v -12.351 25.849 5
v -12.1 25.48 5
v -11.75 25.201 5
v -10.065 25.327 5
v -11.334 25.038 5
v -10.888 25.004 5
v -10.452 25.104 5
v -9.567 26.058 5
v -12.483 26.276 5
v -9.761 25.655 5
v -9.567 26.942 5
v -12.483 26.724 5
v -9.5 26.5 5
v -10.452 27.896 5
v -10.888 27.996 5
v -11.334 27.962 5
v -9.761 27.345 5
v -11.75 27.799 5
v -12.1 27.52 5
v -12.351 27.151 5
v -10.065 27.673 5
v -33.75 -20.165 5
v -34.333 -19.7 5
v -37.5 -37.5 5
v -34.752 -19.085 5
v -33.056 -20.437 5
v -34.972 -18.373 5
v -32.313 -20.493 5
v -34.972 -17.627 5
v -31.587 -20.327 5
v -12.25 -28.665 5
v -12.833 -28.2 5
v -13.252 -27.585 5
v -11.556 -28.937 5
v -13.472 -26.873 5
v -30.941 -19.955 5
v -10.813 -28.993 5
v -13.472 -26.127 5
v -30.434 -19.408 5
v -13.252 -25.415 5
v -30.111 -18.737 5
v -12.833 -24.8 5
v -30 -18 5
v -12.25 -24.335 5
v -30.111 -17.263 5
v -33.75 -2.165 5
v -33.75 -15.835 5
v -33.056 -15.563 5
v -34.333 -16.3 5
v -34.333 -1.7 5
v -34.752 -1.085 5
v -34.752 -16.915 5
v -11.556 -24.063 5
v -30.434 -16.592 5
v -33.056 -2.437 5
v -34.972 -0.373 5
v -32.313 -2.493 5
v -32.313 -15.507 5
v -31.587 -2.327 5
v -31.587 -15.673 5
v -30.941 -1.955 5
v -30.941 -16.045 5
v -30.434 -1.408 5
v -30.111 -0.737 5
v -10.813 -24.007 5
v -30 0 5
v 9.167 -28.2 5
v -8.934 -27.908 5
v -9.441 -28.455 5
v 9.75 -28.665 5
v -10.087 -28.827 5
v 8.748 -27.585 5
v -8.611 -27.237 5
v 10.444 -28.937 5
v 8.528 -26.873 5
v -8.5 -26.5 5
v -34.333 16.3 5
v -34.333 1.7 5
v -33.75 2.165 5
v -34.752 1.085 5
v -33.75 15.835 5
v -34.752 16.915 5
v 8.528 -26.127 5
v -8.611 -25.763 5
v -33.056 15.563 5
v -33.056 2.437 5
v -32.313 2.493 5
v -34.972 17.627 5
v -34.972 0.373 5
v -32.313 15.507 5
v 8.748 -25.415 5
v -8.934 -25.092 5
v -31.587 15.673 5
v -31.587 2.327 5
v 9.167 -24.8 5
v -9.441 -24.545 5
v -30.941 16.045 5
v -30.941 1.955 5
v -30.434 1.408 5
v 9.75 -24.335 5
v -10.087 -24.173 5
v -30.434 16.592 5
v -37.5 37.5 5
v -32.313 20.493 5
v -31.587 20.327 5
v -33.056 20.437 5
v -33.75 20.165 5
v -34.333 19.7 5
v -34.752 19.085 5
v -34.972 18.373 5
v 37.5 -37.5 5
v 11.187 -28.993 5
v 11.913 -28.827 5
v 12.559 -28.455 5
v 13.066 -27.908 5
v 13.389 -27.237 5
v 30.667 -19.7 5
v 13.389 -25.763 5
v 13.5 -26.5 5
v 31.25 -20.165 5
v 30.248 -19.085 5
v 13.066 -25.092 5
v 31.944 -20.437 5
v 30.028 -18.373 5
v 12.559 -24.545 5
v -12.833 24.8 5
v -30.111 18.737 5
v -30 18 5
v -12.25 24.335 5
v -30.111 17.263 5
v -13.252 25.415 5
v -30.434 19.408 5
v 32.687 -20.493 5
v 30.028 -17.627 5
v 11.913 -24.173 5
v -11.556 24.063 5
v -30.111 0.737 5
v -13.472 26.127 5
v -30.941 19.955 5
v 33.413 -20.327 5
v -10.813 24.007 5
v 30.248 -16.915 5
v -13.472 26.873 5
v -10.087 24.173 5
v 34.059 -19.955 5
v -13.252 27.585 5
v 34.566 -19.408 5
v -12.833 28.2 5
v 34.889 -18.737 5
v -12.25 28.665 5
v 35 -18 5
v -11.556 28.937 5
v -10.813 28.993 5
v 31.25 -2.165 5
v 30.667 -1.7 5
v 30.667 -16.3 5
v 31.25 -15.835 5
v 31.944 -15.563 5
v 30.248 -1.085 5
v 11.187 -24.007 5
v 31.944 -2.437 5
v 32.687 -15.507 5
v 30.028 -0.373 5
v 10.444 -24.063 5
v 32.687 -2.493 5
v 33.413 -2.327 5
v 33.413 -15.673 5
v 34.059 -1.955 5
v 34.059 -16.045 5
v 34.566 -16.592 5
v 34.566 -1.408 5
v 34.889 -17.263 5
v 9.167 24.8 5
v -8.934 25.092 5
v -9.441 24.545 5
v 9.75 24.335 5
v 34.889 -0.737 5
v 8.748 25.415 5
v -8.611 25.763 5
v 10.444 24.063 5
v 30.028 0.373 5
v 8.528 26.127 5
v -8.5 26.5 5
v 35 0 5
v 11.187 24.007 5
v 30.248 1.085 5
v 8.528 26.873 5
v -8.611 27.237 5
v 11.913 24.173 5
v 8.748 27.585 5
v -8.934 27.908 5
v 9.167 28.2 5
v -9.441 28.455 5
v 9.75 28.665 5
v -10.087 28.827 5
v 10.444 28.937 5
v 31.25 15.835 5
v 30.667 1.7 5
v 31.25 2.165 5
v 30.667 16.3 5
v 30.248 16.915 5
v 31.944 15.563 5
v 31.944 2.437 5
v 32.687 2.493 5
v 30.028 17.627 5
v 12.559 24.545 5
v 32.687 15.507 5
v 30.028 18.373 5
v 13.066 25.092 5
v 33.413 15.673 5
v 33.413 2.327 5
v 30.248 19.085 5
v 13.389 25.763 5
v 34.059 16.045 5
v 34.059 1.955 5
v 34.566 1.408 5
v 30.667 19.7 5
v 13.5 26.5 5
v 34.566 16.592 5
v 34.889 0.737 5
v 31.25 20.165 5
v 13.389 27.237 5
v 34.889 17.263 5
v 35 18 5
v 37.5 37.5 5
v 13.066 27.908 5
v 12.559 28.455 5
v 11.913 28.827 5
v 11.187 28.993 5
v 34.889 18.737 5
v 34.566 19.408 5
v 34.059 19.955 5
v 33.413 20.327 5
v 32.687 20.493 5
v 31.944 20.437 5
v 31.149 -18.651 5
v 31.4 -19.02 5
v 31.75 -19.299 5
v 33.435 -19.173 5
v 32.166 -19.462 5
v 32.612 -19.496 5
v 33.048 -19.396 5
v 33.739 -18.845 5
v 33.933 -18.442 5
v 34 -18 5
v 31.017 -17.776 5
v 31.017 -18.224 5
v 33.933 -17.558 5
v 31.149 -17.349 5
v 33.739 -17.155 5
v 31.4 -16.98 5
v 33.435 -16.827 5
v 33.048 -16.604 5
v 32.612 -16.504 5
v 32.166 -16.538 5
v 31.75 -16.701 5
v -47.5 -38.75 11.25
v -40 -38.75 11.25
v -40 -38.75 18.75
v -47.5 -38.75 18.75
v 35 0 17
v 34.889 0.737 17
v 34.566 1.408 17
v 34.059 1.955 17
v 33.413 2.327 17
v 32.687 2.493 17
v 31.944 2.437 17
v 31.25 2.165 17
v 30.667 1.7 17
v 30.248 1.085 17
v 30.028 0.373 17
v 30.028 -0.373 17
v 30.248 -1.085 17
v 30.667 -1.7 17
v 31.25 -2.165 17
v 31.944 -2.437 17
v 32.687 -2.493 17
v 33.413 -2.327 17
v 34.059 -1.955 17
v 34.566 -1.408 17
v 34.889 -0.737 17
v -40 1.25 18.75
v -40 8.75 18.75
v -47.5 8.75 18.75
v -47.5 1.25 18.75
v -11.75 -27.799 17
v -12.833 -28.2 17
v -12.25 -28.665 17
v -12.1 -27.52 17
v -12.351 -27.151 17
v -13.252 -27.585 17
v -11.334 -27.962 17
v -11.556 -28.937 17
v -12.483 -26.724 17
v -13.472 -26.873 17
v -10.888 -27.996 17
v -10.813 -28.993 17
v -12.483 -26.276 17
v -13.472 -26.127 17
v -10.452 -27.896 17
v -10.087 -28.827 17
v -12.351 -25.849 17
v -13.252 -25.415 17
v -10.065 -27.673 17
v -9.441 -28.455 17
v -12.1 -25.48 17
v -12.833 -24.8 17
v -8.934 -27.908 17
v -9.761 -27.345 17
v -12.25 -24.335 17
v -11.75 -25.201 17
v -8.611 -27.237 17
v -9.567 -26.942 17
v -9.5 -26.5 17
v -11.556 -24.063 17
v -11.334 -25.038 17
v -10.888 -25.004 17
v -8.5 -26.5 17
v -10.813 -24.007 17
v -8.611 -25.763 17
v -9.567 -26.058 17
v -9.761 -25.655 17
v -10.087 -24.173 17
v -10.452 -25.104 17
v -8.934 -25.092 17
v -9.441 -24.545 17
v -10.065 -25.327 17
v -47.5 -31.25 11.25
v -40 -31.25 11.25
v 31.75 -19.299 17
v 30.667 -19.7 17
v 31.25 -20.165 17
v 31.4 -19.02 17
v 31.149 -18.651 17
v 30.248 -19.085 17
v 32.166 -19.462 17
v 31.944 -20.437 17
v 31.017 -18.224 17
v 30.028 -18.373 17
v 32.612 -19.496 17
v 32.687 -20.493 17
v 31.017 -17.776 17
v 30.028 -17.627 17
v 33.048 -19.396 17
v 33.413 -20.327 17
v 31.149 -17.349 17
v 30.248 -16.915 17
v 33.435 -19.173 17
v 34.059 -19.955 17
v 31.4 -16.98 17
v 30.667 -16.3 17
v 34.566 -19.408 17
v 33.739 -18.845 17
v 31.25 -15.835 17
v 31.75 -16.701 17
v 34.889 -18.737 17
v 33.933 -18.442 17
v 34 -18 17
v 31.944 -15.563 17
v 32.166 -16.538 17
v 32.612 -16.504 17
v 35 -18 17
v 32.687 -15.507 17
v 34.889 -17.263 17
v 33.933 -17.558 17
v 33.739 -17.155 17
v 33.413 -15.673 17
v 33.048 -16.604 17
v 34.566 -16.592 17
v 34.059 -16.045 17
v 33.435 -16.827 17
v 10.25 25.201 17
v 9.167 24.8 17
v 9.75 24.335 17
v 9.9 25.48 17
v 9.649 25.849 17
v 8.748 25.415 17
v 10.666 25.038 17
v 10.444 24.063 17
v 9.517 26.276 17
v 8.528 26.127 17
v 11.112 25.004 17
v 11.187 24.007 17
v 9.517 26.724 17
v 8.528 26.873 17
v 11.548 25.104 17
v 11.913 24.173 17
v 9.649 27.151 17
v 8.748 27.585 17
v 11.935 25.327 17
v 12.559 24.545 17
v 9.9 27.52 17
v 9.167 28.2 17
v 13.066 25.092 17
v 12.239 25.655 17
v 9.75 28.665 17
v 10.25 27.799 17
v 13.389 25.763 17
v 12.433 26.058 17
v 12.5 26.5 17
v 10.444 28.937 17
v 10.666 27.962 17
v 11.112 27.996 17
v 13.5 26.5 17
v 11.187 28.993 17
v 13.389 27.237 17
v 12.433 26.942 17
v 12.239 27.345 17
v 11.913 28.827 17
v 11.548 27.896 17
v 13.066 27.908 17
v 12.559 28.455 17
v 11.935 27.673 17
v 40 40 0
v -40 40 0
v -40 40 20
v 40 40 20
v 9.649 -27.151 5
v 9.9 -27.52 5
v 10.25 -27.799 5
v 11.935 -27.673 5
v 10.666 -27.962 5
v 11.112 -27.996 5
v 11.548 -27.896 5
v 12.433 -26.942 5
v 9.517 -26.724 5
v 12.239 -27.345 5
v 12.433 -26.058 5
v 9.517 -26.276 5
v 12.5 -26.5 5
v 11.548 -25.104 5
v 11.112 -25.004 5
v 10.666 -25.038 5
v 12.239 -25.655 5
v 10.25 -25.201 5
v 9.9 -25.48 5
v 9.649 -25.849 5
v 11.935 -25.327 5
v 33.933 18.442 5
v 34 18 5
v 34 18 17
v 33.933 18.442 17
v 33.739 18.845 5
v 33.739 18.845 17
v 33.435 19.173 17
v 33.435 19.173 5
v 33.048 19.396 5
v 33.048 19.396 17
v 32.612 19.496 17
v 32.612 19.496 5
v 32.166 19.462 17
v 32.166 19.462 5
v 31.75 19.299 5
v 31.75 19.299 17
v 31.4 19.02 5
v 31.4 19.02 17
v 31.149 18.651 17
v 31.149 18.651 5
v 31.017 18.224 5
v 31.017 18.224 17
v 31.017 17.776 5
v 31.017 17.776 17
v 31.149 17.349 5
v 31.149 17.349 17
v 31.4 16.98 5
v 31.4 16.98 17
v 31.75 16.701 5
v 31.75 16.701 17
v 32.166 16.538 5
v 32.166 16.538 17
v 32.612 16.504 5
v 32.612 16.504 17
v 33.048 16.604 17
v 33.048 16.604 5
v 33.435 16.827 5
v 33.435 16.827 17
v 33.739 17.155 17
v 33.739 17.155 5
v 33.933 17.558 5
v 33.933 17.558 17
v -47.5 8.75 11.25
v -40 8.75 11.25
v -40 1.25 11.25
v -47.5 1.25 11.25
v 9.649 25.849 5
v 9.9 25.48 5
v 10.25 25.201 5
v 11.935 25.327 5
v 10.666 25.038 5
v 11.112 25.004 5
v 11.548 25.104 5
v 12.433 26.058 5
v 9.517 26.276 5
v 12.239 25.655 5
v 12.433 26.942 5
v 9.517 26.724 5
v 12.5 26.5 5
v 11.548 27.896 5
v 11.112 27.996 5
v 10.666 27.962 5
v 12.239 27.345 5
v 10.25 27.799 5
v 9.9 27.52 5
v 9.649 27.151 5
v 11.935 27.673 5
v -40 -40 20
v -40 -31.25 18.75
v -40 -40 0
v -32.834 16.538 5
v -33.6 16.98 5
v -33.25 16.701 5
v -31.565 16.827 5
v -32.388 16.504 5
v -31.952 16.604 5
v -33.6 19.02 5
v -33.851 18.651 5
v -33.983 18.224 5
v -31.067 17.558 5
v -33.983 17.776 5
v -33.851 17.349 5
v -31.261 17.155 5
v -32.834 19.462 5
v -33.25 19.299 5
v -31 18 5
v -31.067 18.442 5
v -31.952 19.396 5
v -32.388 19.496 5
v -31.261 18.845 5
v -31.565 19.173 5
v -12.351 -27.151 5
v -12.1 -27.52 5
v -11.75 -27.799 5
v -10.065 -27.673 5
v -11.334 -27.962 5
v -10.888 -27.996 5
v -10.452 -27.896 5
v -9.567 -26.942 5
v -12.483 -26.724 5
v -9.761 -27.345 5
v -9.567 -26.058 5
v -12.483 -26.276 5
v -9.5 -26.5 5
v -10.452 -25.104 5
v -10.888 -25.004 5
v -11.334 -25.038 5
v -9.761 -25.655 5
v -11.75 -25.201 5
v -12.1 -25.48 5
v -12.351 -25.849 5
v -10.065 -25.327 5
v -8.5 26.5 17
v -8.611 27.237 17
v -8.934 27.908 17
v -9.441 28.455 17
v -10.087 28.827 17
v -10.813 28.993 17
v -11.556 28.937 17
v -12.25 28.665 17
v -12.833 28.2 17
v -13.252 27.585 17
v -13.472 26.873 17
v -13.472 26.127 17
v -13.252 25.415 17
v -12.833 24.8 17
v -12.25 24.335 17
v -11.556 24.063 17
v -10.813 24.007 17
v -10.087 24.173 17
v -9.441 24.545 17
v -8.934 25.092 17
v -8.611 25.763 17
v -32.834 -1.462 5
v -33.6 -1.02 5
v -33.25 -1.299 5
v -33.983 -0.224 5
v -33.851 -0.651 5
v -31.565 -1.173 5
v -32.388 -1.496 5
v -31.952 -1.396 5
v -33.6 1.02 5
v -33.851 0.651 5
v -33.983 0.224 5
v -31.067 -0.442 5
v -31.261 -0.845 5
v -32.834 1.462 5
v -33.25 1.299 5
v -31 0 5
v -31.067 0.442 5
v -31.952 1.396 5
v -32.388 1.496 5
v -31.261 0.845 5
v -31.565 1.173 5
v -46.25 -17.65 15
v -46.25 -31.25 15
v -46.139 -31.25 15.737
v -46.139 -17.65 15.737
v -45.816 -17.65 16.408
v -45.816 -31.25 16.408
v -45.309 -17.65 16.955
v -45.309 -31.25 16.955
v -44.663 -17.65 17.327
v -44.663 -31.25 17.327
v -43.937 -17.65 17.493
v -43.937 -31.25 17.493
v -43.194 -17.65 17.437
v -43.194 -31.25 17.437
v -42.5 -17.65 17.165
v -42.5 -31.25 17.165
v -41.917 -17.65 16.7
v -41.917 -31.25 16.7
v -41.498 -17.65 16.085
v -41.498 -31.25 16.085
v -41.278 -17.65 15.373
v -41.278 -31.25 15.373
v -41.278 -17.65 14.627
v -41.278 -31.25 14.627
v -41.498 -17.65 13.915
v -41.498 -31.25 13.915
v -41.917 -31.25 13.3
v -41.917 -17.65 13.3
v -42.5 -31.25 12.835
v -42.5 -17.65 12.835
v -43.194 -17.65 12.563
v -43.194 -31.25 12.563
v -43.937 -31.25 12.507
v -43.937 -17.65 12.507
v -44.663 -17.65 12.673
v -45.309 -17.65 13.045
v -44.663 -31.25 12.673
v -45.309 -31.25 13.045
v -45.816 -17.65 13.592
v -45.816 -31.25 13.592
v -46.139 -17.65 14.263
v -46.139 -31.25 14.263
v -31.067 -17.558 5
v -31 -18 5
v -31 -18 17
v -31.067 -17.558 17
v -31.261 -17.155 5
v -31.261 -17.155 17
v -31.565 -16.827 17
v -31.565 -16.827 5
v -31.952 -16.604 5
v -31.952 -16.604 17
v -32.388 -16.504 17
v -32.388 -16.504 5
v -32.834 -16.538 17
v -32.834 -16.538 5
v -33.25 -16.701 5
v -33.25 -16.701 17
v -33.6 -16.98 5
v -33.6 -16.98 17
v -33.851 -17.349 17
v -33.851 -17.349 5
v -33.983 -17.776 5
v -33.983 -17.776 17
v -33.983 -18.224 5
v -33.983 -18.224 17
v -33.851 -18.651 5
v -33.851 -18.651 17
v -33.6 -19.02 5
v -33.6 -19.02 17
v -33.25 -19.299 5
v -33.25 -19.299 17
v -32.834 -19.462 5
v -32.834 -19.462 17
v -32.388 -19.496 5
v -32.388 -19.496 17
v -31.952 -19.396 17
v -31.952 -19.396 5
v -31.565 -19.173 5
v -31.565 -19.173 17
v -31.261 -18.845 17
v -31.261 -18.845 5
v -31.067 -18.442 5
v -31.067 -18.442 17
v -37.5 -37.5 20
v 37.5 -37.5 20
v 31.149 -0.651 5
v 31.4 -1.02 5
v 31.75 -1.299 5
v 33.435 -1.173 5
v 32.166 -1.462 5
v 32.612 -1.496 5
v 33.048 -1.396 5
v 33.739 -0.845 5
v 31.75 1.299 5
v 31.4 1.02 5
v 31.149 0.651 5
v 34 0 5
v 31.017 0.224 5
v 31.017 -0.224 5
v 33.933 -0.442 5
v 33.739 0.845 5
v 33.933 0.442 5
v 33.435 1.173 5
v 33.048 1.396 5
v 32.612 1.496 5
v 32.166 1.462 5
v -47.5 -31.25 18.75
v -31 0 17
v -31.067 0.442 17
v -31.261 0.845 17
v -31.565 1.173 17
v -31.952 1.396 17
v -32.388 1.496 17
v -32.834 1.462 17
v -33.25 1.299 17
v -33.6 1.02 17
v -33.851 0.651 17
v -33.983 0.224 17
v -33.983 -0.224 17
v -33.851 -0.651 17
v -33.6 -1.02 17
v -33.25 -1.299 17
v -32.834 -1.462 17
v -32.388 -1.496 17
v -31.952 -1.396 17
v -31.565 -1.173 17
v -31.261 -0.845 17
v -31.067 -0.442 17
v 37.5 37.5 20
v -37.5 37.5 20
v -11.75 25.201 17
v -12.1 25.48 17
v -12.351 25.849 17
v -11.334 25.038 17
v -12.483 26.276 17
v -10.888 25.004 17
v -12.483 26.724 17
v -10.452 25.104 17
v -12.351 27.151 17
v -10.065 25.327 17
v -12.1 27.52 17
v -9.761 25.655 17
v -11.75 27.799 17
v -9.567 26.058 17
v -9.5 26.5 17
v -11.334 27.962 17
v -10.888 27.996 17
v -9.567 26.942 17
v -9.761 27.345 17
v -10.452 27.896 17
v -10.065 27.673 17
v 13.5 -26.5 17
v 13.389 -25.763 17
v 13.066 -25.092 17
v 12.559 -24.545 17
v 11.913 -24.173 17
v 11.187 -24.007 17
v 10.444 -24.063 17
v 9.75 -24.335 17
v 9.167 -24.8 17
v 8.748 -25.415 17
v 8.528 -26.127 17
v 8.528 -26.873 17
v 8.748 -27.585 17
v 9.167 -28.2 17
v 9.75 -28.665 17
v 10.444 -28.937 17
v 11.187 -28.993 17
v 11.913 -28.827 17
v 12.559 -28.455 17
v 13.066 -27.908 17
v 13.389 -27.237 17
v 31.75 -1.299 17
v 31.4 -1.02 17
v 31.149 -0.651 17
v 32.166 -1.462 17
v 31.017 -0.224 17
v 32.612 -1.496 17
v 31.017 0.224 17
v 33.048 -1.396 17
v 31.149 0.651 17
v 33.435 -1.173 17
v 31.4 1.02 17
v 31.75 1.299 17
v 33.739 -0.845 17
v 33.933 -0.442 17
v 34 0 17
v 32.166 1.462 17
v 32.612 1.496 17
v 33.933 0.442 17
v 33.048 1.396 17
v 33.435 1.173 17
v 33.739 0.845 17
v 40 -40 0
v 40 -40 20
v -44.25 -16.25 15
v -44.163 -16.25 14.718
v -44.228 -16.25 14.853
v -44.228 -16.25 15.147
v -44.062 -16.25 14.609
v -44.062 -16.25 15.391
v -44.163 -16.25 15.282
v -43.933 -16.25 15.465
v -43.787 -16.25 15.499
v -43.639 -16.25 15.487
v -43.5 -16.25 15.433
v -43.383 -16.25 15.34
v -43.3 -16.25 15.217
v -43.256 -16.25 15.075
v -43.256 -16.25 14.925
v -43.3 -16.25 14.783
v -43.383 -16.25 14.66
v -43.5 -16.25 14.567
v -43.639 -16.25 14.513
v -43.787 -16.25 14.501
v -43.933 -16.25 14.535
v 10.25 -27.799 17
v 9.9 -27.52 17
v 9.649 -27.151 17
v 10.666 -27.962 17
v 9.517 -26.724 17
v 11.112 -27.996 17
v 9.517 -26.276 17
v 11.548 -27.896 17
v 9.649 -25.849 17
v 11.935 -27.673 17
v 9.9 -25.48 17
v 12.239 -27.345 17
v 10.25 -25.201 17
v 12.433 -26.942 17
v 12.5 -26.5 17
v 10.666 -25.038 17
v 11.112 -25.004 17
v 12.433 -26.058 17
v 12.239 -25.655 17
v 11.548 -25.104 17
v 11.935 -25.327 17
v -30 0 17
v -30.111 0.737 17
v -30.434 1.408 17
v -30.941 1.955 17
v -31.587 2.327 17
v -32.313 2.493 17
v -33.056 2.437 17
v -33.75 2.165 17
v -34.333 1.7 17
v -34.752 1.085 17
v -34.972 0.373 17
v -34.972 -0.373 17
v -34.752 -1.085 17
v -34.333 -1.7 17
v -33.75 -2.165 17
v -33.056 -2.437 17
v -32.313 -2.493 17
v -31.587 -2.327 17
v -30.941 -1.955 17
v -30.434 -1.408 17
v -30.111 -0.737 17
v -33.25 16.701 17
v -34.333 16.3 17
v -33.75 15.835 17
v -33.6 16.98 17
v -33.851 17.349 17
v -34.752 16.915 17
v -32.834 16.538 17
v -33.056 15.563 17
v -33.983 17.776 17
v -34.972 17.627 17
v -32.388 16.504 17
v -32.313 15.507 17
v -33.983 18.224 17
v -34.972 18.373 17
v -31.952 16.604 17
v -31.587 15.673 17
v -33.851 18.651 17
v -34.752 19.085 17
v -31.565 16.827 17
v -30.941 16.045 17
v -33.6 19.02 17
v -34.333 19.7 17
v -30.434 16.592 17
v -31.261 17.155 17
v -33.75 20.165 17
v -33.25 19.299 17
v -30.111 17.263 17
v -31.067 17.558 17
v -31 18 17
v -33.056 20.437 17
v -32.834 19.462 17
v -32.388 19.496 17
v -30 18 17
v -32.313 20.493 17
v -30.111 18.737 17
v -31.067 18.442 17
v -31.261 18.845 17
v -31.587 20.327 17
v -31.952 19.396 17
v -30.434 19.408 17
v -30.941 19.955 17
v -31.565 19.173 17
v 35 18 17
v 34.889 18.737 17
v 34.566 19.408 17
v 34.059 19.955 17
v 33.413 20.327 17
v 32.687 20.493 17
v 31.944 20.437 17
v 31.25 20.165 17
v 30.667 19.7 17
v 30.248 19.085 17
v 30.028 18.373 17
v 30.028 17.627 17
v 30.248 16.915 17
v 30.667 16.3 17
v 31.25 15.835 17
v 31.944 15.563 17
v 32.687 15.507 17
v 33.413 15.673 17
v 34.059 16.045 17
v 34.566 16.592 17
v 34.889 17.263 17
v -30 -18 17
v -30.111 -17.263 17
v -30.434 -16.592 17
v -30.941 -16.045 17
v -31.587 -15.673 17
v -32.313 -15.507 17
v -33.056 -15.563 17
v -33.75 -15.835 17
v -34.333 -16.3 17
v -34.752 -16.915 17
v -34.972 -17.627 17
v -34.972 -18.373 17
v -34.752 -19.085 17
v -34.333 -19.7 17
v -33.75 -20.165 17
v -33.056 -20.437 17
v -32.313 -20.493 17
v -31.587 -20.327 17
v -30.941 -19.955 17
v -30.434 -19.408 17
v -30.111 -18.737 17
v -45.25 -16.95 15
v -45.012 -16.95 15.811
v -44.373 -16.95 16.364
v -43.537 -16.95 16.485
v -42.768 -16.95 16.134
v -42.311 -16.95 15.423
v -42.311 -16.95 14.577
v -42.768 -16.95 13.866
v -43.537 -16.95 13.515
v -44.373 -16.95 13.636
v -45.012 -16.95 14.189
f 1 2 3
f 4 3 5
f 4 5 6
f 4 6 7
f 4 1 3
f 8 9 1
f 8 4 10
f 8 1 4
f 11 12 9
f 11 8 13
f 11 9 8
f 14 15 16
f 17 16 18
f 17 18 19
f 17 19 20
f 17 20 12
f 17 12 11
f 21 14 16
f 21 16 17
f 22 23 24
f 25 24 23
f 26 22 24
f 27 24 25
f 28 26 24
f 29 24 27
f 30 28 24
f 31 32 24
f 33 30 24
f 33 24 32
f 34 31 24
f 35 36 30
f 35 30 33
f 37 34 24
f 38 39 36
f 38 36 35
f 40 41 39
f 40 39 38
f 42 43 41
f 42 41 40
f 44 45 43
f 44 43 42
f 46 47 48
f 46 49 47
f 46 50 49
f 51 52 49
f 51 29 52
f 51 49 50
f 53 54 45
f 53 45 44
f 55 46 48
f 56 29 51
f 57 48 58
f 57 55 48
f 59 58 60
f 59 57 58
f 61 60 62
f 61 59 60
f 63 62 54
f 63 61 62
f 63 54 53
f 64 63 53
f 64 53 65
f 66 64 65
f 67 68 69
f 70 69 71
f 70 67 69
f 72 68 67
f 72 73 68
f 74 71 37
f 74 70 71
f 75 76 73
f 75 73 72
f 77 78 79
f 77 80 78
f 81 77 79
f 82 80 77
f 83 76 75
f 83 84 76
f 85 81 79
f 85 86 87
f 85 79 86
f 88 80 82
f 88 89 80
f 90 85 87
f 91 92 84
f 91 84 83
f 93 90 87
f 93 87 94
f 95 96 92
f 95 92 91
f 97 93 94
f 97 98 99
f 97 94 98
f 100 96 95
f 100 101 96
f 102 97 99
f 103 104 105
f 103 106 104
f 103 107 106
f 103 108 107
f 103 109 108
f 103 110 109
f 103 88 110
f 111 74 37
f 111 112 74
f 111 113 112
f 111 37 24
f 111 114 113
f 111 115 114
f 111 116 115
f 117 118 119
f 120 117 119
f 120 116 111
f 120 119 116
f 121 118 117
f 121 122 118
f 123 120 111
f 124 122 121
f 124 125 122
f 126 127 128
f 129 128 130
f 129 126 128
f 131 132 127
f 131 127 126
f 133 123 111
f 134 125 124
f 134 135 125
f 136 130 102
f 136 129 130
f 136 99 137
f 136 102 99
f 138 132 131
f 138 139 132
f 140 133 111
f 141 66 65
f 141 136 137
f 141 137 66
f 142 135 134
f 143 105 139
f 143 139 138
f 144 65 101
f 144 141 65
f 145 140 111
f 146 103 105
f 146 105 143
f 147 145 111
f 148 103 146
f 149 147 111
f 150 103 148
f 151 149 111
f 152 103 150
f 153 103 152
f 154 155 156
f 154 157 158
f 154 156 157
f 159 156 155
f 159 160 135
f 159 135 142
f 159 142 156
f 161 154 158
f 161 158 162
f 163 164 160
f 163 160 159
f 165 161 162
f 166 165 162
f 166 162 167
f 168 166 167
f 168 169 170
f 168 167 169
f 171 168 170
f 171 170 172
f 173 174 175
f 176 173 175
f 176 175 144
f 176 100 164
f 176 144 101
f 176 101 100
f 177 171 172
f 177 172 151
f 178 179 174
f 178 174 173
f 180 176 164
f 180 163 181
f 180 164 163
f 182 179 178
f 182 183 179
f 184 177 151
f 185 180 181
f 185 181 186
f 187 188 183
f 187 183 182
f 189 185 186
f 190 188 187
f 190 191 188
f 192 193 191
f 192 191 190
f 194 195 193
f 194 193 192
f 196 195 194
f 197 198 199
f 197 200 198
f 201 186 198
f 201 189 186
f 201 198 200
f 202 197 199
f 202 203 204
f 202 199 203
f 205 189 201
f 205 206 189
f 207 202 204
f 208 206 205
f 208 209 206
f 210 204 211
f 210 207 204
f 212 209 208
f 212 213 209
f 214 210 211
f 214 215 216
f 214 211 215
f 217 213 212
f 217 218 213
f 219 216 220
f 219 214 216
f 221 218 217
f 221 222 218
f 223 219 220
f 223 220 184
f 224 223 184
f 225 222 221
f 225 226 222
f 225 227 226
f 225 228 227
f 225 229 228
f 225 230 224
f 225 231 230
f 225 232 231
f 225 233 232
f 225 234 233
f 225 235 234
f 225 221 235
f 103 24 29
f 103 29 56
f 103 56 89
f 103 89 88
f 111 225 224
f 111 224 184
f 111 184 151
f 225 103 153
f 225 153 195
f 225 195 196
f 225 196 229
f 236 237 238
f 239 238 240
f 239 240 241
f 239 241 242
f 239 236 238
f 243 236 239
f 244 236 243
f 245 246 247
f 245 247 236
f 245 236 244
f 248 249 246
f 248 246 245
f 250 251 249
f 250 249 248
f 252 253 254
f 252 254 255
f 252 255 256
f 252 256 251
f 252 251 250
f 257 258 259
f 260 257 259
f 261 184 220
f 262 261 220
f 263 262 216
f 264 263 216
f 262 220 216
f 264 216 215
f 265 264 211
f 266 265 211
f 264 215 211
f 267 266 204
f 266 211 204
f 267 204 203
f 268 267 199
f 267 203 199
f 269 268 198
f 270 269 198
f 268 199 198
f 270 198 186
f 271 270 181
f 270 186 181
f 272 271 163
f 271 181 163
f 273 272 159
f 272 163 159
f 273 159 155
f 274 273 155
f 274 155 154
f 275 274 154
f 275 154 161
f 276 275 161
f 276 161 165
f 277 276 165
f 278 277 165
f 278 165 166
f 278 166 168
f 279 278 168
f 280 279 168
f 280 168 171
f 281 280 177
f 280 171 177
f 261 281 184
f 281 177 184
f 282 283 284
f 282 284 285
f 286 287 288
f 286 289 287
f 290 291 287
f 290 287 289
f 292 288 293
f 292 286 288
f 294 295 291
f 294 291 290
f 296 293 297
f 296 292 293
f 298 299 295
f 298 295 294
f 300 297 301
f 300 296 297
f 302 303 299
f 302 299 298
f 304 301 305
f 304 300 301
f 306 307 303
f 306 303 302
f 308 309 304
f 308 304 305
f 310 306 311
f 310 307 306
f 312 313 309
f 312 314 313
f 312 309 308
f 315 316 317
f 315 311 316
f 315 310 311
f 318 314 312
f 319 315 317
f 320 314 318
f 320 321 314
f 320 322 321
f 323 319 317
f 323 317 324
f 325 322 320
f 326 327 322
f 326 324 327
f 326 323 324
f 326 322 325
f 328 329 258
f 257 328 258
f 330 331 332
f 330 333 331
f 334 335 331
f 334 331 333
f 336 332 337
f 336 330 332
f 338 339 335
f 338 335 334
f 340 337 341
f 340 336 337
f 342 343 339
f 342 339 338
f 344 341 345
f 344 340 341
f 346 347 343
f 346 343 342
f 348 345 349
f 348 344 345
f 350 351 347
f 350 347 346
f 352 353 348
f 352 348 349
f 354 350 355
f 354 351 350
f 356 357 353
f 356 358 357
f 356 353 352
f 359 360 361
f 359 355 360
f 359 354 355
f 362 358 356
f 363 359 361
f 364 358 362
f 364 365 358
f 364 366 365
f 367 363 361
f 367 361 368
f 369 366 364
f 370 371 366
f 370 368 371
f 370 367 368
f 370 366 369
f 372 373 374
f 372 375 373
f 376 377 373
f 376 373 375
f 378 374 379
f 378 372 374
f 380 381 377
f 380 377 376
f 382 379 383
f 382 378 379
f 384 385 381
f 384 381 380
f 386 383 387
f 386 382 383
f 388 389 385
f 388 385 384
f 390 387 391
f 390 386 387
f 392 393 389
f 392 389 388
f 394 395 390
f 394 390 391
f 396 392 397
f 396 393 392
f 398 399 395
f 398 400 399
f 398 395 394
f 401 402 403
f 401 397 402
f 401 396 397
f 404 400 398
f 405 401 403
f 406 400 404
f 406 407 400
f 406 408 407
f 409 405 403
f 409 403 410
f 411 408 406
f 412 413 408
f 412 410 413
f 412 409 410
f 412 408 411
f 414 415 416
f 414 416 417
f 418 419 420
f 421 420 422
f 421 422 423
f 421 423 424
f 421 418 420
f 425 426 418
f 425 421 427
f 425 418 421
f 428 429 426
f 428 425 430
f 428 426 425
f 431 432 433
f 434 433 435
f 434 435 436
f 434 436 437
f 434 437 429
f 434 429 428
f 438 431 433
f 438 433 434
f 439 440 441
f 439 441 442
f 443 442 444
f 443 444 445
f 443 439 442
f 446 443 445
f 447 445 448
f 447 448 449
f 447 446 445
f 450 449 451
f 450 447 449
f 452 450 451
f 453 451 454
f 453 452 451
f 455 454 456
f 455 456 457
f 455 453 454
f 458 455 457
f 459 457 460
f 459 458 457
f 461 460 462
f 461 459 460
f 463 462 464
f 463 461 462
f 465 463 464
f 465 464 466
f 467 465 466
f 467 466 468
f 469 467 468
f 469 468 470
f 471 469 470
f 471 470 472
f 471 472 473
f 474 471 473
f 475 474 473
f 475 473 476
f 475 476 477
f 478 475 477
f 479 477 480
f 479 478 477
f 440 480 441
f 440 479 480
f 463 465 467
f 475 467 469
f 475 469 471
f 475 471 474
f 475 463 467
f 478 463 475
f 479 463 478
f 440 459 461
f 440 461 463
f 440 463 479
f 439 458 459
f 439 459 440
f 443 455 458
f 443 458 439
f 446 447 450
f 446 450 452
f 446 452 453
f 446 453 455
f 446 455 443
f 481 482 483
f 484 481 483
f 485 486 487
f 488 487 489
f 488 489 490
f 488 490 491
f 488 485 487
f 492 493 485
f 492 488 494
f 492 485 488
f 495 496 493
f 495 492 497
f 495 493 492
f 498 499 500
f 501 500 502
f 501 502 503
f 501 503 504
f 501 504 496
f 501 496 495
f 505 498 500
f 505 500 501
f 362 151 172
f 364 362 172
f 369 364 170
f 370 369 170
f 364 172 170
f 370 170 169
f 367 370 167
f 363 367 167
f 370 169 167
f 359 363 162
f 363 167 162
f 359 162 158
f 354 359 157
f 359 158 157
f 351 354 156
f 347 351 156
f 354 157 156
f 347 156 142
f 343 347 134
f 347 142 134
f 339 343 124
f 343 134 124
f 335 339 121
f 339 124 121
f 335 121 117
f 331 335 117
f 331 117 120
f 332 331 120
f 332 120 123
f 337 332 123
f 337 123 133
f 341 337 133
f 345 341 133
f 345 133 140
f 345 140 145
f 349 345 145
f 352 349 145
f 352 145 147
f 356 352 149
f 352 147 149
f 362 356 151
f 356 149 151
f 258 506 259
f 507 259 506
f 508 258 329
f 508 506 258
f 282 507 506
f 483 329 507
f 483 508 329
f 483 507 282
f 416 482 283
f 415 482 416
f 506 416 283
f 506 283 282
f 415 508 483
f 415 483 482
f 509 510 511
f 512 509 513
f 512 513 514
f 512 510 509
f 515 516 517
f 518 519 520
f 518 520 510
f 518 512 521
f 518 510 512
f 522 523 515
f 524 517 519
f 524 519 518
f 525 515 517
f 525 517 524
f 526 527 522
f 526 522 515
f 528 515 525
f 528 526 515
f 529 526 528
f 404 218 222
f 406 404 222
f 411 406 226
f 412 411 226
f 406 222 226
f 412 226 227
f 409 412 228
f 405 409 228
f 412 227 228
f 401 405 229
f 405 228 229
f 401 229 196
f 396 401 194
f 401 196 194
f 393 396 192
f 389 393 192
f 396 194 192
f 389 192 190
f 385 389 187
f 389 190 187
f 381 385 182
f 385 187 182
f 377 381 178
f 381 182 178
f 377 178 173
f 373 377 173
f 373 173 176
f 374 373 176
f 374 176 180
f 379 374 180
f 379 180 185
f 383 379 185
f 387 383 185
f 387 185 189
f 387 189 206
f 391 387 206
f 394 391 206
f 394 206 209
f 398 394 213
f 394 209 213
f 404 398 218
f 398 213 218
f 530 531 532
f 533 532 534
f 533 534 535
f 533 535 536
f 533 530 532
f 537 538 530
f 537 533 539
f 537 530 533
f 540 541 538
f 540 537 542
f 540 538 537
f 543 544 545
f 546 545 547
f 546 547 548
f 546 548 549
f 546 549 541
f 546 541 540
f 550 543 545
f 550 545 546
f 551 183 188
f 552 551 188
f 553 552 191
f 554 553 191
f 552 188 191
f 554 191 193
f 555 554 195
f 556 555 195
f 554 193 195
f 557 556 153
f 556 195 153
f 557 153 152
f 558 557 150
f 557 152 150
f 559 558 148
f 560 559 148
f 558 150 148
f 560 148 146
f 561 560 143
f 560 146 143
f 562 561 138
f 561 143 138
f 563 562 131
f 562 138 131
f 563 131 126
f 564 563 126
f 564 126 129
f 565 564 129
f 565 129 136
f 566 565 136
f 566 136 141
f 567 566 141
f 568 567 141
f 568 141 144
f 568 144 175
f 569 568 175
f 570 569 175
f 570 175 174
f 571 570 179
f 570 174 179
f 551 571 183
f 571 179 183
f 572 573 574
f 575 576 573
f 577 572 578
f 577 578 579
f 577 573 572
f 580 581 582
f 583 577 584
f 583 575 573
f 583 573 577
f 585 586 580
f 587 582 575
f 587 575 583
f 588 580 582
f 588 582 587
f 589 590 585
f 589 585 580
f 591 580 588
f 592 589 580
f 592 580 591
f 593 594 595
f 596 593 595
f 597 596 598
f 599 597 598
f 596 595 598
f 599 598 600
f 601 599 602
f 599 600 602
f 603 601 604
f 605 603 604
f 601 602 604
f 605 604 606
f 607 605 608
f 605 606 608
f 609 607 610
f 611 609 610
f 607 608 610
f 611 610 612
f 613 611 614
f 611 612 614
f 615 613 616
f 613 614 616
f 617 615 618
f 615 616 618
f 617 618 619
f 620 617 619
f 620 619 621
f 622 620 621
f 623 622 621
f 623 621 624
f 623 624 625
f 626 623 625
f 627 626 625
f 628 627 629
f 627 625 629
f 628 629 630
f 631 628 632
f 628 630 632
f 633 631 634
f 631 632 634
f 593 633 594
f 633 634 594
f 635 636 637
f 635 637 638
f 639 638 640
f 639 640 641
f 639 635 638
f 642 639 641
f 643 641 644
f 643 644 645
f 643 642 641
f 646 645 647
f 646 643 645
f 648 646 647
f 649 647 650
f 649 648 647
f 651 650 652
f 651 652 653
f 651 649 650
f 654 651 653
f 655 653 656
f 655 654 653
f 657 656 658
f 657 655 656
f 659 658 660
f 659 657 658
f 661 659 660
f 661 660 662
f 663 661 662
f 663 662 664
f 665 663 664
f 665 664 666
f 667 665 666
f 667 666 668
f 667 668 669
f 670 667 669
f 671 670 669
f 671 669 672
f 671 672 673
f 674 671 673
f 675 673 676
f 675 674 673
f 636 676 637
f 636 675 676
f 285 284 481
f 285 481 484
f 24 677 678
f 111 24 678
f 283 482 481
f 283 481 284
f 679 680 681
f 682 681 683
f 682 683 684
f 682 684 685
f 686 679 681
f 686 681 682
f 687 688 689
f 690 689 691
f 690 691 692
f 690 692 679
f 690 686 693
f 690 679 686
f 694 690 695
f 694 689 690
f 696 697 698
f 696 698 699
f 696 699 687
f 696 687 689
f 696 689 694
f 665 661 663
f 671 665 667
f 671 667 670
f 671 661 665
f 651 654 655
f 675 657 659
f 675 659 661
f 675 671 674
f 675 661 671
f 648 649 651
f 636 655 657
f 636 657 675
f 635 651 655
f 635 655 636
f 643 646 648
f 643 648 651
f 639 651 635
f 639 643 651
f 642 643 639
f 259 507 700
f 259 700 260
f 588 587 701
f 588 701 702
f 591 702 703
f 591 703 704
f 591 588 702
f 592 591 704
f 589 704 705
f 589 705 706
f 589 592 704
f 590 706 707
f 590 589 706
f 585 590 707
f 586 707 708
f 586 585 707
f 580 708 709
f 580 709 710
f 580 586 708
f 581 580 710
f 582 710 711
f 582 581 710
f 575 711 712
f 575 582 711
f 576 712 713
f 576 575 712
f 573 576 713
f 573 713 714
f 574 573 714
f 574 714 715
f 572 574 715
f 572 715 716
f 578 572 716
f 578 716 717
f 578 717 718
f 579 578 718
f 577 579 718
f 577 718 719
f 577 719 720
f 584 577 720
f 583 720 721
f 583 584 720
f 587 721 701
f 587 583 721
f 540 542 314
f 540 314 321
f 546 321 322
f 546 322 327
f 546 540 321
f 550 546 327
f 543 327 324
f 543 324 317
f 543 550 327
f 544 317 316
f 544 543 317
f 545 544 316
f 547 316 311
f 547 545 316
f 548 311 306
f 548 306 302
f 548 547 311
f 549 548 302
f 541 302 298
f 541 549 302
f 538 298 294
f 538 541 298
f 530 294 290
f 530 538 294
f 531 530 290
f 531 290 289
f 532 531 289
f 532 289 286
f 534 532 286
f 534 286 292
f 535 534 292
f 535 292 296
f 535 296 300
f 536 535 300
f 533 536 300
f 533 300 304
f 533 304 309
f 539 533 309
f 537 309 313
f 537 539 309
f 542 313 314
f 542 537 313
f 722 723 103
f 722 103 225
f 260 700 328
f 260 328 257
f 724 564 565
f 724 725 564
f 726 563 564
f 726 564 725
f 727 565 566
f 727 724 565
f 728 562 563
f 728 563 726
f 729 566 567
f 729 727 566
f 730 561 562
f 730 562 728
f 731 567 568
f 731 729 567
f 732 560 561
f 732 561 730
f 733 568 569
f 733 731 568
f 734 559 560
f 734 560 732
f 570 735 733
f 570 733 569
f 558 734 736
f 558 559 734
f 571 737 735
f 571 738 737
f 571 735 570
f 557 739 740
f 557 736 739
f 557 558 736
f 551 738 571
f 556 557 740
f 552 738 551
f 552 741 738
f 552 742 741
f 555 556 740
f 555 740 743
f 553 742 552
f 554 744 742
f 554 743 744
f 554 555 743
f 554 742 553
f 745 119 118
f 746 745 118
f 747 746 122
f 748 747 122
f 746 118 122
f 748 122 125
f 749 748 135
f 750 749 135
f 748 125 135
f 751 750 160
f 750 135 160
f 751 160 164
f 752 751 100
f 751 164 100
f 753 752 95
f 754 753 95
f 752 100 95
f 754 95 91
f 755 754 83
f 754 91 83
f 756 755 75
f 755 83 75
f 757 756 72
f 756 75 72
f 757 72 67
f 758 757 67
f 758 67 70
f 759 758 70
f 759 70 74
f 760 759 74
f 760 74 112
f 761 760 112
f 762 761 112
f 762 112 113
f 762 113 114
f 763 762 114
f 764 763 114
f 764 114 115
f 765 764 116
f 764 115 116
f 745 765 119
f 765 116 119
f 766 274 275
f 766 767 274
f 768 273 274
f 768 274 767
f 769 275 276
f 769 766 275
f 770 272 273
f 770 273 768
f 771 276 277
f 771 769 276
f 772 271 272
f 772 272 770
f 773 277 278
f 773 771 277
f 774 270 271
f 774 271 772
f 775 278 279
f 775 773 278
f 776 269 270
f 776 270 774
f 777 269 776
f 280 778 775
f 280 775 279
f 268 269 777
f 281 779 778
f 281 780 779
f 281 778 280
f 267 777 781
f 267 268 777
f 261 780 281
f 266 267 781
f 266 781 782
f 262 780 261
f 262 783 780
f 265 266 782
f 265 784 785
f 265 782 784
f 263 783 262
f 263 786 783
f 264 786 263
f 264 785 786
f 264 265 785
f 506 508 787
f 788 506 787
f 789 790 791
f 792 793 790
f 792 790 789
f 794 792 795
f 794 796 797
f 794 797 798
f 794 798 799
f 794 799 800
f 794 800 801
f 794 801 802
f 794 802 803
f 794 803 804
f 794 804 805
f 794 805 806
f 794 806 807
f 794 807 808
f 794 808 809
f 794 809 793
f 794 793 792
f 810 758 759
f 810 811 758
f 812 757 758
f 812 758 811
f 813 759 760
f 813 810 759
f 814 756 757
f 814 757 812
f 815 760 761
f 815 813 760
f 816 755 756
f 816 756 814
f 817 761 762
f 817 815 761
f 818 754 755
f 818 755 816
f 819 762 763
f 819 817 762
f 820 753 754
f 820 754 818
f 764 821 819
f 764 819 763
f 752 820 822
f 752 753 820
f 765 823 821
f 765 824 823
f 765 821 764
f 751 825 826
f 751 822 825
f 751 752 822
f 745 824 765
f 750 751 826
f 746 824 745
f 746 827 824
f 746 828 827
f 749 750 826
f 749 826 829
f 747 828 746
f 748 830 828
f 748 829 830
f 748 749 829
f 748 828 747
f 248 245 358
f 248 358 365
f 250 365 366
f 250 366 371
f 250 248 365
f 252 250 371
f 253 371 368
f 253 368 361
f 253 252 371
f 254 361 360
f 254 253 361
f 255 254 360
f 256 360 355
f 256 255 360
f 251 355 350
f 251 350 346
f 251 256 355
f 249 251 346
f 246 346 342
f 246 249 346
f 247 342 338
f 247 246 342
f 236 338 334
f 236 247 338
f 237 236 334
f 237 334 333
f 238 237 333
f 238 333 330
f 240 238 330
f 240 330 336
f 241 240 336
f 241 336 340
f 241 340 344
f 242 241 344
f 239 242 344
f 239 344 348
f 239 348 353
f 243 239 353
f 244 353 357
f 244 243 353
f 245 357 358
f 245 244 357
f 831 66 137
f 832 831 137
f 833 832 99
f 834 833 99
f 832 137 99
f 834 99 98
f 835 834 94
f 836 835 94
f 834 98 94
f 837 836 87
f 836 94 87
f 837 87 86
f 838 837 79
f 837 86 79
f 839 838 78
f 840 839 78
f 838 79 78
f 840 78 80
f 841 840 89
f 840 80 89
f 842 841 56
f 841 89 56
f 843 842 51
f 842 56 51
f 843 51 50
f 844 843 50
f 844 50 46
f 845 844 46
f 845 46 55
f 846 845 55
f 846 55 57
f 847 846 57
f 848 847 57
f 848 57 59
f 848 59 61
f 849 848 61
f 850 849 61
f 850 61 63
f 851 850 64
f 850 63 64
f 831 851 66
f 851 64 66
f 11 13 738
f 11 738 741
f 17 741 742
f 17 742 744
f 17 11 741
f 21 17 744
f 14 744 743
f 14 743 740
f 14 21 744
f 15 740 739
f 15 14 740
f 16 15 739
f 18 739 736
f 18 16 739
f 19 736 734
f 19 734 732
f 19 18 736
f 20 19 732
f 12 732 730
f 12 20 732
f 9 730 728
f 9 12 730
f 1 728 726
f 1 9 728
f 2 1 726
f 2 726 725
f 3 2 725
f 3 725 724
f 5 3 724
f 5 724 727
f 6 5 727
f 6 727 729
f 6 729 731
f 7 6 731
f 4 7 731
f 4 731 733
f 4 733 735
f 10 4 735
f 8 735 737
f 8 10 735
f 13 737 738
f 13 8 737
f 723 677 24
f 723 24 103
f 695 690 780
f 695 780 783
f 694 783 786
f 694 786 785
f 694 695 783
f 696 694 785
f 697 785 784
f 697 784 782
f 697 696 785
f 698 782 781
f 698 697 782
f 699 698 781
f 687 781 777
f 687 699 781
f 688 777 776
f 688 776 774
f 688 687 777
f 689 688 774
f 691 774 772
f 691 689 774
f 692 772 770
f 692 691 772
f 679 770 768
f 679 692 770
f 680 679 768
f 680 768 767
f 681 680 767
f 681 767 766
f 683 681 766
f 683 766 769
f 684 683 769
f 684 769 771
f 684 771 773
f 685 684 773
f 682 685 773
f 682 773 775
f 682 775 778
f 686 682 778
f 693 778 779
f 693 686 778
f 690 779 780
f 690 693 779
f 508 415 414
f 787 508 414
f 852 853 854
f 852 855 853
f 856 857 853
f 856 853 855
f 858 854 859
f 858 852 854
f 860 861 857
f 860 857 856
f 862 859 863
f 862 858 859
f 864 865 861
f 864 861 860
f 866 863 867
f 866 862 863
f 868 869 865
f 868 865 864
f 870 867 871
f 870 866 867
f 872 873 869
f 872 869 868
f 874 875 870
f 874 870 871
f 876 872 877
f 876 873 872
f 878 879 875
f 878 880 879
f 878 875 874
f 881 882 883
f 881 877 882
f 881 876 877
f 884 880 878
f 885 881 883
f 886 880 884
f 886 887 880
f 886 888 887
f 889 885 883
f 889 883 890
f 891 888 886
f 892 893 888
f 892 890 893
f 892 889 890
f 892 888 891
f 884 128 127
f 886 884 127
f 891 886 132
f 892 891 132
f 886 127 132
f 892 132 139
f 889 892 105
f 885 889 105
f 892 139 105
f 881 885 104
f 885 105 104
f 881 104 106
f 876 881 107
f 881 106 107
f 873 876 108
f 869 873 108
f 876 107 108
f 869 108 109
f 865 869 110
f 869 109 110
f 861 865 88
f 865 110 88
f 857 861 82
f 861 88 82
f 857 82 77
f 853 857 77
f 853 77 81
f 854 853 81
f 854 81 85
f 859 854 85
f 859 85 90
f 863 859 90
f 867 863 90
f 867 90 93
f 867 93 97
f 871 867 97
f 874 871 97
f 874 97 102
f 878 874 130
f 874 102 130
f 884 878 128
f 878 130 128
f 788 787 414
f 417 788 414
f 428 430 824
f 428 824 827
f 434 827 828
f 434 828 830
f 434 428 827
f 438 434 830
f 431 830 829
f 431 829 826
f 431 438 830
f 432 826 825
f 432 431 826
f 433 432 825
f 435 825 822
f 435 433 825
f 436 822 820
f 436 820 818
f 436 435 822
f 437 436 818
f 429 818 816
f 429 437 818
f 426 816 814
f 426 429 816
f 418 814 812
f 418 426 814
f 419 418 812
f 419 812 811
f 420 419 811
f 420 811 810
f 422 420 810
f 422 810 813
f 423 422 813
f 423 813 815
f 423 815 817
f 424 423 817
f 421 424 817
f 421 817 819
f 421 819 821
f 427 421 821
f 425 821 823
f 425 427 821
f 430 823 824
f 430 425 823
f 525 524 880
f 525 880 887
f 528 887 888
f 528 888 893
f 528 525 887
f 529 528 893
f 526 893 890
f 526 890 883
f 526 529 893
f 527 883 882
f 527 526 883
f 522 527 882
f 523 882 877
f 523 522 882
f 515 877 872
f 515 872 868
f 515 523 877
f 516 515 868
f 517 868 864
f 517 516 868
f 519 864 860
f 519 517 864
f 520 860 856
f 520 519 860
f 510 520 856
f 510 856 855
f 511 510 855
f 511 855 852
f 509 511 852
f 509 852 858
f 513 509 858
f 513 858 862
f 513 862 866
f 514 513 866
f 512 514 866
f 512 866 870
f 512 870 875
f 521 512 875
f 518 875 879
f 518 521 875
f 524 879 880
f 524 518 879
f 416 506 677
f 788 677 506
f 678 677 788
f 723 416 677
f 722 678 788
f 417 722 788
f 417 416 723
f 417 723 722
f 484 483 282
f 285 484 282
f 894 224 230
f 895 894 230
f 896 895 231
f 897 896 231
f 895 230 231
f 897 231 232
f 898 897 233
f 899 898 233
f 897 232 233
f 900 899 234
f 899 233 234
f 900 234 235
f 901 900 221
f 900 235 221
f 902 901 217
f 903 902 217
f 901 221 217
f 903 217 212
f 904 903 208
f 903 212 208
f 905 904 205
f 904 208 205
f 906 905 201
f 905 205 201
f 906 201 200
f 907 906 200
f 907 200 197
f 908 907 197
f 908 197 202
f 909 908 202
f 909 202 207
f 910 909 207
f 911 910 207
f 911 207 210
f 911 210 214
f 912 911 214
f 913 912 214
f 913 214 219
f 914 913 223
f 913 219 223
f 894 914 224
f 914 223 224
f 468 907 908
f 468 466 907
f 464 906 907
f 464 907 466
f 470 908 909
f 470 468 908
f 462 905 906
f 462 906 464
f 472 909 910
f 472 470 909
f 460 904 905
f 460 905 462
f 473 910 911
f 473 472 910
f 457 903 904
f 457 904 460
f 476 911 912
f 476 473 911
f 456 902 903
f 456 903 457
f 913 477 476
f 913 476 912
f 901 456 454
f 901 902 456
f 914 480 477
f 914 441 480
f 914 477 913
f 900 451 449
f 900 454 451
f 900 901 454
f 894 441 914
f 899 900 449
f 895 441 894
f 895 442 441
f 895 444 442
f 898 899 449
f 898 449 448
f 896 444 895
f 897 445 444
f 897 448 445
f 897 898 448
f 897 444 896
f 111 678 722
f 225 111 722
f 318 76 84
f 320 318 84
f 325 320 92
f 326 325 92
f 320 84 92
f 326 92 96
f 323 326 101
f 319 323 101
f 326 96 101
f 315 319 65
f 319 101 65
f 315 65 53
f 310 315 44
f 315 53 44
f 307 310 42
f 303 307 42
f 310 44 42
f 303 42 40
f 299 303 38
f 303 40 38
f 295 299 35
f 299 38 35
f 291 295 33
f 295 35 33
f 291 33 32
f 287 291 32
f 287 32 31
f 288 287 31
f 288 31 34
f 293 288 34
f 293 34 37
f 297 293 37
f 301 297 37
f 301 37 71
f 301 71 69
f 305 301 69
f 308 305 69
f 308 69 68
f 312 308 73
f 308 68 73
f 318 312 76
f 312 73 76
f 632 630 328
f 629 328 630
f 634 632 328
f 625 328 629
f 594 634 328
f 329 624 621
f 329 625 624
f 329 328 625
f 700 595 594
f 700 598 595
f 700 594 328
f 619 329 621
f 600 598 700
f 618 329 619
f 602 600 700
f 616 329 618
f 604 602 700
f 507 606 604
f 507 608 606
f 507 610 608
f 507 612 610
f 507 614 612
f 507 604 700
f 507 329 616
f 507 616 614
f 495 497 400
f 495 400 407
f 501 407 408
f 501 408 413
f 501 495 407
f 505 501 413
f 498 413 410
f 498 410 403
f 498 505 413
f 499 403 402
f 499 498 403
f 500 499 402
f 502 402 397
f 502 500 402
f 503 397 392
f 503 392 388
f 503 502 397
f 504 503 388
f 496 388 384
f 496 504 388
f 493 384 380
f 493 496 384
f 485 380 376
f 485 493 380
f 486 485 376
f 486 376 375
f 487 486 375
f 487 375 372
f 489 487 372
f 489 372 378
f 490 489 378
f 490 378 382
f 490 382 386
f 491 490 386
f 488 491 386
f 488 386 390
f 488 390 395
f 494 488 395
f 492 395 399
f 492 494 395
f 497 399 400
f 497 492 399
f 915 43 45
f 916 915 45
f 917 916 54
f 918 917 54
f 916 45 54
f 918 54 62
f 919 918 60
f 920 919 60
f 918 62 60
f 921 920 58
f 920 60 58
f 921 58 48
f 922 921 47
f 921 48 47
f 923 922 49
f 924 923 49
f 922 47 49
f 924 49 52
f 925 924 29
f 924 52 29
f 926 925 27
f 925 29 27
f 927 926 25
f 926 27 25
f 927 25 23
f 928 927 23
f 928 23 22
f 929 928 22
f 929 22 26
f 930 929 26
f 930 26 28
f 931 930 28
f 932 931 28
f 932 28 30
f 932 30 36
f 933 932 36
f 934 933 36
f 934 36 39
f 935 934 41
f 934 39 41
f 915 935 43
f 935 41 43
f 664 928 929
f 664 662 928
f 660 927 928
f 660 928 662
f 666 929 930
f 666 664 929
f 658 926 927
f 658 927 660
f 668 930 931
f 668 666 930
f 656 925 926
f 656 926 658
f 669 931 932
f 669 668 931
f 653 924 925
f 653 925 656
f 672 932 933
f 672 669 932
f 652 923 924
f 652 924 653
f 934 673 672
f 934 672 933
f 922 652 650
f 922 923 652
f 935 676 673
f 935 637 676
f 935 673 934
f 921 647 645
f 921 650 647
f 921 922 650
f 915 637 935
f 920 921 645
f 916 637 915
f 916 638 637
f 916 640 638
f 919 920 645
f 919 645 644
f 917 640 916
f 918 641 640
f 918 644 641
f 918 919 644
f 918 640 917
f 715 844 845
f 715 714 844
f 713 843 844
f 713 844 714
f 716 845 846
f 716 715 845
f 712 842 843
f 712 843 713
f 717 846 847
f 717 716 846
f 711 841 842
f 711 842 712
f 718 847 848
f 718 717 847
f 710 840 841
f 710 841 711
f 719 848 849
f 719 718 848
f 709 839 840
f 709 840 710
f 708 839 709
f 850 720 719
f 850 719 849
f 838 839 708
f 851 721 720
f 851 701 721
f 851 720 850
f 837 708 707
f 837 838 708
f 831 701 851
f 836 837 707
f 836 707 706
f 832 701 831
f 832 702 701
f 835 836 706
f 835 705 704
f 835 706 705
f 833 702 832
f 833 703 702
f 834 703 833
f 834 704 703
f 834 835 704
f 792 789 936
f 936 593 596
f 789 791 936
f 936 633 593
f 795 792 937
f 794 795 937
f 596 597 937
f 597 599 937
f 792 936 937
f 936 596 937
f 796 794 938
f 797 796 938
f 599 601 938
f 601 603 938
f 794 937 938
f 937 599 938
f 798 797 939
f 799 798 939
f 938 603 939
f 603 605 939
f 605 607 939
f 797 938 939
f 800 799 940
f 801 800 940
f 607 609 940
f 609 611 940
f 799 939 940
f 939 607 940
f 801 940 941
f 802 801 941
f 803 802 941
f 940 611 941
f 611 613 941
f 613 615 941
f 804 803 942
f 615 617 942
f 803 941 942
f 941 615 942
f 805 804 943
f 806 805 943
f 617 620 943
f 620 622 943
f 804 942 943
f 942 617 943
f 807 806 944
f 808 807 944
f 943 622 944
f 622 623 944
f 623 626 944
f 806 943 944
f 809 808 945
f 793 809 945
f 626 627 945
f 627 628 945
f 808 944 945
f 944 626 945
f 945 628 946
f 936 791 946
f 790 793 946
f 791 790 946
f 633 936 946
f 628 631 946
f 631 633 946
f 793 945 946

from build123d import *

# Parameters (mm, degrees)
F0_W      = 80
F0_H      = 80
F1_DEPTH  = 20
F2_W      = 75
F2_H      = 75
F3_DEPTH  = 15
F4_R      = 2.5
F4_R_2    = 1.5
F5_DEPTH  = 12
F6_W      = 7.5
F6_H      = 7.5
F7_DEPTH  = 7.5
F8_R      = 2.5
F9_DEPTH  = 15
F10_SIZE2 = 1.4004150764
F10_SIZE  = 2


with BuildPart() as f1:
    # F0 (on Top) → F1 (new body)
    with BuildSketch(Plane.XY):
        Rectangle(F0_W, F0_H)
    extrude(amount=F1_DEPTH)

    # F2 (on face) → F3 (cut)
    with BuildSketch(Plane.XY.offset(20)):
        Rectangle(F2_W, F2_H)
    extrude(amount=-F3_DEPTH, mode=Mode.SUBTRACT)

    # F4 (on face) → F5 (join)
    with BuildSketch(Plane.XY.offset(5)):
        with Locations((-11, 26.5)):
            Circle(F4_R)
        with Locations((-11, 26.5)):
            Circle(F4_R_2, mode=Mode.SUBTRACT)
        with Locations((11, 26.5)):
            Circle(F4_R)
        with Locations((11, 26.5)):
            Circle(F4_R_2, mode=Mode.SUBTRACT)
        with Locations((-11, -26.5)):
            Circle(F4_R)
        with Locations((-11, -26.5)):
            Circle(F4_R_2, mode=Mode.SUBTRACT)
        with Locations((11, -26.5)):
            Circle(F4_R)
        with Locations((11, -26.5)):
            Circle(F4_R_2, mode=Mode.SUBTRACT)
        with Locations((-32.5, 18)):
            Circle(F4_R)
        with Locations((-32.5, 18)):
            Circle(F4_R_2, mode=Mode.SUBTRACT)
        with Locations((-32.5, 0)):
            Circle(F4_R)
        with Locations((-32.5, 0)):
            Circle(F4_R_2, mode=Mode.SUBTRACT)
        with Locations((-32.5, -18)):
            Circle(F4_R)
        with Locations((-32.5, -18)):
            Circle(F4_R_2, mode=Mode.SUBTRACT)
        with Locations((32.5, 0)):
            Circle(F4_R)
        with Locations((32.5, 0)):
            Circle(F4_R_2, mode=Mode.SUBTRACT)
        with Locations((32.5, -18)):
            Circle(F4_R)
        with Locations((32.5, -18)):
            Circle(F4_R_2, mode=Mode.SUBTRACT)
        with Locations((32.5, 18)):
            Circle(F4_R)
        with Locations((32.5, 18)):
            Circle(F4_R_2, mode=Mode.SUBTRACT)
    extrude(amount=F5_DEPTH)

    # F6 (on face) → F7 (join)
    with BuildSketch(Plane(origin=(-40, 0, 0), x_dir=(0, -1, 0), z_dir=(-1, 0, 0))):
        with Locations((35, 15)):
            Rectangle(F6_W, F6_H)
        with Locations((-5, 15)):
            Rectangle(F6_W, F6_H)
    extrude(amount=F7_DEPTH)

    # F8 (on face) → F9 (join)
    with BuildSketch(Plane(origin=(0, -31.25, 0), x_dir=(-1, 0, 0), z_dir=(0, 1, 0))):
        with Locations((43.75, 15)):
            Circle(F8_R)
    extrude(amount=F9_DEPTH)

    # F10
    f10_edges = [f1.edges().sort_by_distance(p)[0] for p in [
        (-41.25, -16.25, 15),
    ]]
    f10_side = f1.faces().sort_by_distance((-43.75, -16.25, 15))[0]
    chamfer(f10_edges, length=F10_SIZE, length2=F10_SIZE2, reference=f10_side)


solid = f1.part
